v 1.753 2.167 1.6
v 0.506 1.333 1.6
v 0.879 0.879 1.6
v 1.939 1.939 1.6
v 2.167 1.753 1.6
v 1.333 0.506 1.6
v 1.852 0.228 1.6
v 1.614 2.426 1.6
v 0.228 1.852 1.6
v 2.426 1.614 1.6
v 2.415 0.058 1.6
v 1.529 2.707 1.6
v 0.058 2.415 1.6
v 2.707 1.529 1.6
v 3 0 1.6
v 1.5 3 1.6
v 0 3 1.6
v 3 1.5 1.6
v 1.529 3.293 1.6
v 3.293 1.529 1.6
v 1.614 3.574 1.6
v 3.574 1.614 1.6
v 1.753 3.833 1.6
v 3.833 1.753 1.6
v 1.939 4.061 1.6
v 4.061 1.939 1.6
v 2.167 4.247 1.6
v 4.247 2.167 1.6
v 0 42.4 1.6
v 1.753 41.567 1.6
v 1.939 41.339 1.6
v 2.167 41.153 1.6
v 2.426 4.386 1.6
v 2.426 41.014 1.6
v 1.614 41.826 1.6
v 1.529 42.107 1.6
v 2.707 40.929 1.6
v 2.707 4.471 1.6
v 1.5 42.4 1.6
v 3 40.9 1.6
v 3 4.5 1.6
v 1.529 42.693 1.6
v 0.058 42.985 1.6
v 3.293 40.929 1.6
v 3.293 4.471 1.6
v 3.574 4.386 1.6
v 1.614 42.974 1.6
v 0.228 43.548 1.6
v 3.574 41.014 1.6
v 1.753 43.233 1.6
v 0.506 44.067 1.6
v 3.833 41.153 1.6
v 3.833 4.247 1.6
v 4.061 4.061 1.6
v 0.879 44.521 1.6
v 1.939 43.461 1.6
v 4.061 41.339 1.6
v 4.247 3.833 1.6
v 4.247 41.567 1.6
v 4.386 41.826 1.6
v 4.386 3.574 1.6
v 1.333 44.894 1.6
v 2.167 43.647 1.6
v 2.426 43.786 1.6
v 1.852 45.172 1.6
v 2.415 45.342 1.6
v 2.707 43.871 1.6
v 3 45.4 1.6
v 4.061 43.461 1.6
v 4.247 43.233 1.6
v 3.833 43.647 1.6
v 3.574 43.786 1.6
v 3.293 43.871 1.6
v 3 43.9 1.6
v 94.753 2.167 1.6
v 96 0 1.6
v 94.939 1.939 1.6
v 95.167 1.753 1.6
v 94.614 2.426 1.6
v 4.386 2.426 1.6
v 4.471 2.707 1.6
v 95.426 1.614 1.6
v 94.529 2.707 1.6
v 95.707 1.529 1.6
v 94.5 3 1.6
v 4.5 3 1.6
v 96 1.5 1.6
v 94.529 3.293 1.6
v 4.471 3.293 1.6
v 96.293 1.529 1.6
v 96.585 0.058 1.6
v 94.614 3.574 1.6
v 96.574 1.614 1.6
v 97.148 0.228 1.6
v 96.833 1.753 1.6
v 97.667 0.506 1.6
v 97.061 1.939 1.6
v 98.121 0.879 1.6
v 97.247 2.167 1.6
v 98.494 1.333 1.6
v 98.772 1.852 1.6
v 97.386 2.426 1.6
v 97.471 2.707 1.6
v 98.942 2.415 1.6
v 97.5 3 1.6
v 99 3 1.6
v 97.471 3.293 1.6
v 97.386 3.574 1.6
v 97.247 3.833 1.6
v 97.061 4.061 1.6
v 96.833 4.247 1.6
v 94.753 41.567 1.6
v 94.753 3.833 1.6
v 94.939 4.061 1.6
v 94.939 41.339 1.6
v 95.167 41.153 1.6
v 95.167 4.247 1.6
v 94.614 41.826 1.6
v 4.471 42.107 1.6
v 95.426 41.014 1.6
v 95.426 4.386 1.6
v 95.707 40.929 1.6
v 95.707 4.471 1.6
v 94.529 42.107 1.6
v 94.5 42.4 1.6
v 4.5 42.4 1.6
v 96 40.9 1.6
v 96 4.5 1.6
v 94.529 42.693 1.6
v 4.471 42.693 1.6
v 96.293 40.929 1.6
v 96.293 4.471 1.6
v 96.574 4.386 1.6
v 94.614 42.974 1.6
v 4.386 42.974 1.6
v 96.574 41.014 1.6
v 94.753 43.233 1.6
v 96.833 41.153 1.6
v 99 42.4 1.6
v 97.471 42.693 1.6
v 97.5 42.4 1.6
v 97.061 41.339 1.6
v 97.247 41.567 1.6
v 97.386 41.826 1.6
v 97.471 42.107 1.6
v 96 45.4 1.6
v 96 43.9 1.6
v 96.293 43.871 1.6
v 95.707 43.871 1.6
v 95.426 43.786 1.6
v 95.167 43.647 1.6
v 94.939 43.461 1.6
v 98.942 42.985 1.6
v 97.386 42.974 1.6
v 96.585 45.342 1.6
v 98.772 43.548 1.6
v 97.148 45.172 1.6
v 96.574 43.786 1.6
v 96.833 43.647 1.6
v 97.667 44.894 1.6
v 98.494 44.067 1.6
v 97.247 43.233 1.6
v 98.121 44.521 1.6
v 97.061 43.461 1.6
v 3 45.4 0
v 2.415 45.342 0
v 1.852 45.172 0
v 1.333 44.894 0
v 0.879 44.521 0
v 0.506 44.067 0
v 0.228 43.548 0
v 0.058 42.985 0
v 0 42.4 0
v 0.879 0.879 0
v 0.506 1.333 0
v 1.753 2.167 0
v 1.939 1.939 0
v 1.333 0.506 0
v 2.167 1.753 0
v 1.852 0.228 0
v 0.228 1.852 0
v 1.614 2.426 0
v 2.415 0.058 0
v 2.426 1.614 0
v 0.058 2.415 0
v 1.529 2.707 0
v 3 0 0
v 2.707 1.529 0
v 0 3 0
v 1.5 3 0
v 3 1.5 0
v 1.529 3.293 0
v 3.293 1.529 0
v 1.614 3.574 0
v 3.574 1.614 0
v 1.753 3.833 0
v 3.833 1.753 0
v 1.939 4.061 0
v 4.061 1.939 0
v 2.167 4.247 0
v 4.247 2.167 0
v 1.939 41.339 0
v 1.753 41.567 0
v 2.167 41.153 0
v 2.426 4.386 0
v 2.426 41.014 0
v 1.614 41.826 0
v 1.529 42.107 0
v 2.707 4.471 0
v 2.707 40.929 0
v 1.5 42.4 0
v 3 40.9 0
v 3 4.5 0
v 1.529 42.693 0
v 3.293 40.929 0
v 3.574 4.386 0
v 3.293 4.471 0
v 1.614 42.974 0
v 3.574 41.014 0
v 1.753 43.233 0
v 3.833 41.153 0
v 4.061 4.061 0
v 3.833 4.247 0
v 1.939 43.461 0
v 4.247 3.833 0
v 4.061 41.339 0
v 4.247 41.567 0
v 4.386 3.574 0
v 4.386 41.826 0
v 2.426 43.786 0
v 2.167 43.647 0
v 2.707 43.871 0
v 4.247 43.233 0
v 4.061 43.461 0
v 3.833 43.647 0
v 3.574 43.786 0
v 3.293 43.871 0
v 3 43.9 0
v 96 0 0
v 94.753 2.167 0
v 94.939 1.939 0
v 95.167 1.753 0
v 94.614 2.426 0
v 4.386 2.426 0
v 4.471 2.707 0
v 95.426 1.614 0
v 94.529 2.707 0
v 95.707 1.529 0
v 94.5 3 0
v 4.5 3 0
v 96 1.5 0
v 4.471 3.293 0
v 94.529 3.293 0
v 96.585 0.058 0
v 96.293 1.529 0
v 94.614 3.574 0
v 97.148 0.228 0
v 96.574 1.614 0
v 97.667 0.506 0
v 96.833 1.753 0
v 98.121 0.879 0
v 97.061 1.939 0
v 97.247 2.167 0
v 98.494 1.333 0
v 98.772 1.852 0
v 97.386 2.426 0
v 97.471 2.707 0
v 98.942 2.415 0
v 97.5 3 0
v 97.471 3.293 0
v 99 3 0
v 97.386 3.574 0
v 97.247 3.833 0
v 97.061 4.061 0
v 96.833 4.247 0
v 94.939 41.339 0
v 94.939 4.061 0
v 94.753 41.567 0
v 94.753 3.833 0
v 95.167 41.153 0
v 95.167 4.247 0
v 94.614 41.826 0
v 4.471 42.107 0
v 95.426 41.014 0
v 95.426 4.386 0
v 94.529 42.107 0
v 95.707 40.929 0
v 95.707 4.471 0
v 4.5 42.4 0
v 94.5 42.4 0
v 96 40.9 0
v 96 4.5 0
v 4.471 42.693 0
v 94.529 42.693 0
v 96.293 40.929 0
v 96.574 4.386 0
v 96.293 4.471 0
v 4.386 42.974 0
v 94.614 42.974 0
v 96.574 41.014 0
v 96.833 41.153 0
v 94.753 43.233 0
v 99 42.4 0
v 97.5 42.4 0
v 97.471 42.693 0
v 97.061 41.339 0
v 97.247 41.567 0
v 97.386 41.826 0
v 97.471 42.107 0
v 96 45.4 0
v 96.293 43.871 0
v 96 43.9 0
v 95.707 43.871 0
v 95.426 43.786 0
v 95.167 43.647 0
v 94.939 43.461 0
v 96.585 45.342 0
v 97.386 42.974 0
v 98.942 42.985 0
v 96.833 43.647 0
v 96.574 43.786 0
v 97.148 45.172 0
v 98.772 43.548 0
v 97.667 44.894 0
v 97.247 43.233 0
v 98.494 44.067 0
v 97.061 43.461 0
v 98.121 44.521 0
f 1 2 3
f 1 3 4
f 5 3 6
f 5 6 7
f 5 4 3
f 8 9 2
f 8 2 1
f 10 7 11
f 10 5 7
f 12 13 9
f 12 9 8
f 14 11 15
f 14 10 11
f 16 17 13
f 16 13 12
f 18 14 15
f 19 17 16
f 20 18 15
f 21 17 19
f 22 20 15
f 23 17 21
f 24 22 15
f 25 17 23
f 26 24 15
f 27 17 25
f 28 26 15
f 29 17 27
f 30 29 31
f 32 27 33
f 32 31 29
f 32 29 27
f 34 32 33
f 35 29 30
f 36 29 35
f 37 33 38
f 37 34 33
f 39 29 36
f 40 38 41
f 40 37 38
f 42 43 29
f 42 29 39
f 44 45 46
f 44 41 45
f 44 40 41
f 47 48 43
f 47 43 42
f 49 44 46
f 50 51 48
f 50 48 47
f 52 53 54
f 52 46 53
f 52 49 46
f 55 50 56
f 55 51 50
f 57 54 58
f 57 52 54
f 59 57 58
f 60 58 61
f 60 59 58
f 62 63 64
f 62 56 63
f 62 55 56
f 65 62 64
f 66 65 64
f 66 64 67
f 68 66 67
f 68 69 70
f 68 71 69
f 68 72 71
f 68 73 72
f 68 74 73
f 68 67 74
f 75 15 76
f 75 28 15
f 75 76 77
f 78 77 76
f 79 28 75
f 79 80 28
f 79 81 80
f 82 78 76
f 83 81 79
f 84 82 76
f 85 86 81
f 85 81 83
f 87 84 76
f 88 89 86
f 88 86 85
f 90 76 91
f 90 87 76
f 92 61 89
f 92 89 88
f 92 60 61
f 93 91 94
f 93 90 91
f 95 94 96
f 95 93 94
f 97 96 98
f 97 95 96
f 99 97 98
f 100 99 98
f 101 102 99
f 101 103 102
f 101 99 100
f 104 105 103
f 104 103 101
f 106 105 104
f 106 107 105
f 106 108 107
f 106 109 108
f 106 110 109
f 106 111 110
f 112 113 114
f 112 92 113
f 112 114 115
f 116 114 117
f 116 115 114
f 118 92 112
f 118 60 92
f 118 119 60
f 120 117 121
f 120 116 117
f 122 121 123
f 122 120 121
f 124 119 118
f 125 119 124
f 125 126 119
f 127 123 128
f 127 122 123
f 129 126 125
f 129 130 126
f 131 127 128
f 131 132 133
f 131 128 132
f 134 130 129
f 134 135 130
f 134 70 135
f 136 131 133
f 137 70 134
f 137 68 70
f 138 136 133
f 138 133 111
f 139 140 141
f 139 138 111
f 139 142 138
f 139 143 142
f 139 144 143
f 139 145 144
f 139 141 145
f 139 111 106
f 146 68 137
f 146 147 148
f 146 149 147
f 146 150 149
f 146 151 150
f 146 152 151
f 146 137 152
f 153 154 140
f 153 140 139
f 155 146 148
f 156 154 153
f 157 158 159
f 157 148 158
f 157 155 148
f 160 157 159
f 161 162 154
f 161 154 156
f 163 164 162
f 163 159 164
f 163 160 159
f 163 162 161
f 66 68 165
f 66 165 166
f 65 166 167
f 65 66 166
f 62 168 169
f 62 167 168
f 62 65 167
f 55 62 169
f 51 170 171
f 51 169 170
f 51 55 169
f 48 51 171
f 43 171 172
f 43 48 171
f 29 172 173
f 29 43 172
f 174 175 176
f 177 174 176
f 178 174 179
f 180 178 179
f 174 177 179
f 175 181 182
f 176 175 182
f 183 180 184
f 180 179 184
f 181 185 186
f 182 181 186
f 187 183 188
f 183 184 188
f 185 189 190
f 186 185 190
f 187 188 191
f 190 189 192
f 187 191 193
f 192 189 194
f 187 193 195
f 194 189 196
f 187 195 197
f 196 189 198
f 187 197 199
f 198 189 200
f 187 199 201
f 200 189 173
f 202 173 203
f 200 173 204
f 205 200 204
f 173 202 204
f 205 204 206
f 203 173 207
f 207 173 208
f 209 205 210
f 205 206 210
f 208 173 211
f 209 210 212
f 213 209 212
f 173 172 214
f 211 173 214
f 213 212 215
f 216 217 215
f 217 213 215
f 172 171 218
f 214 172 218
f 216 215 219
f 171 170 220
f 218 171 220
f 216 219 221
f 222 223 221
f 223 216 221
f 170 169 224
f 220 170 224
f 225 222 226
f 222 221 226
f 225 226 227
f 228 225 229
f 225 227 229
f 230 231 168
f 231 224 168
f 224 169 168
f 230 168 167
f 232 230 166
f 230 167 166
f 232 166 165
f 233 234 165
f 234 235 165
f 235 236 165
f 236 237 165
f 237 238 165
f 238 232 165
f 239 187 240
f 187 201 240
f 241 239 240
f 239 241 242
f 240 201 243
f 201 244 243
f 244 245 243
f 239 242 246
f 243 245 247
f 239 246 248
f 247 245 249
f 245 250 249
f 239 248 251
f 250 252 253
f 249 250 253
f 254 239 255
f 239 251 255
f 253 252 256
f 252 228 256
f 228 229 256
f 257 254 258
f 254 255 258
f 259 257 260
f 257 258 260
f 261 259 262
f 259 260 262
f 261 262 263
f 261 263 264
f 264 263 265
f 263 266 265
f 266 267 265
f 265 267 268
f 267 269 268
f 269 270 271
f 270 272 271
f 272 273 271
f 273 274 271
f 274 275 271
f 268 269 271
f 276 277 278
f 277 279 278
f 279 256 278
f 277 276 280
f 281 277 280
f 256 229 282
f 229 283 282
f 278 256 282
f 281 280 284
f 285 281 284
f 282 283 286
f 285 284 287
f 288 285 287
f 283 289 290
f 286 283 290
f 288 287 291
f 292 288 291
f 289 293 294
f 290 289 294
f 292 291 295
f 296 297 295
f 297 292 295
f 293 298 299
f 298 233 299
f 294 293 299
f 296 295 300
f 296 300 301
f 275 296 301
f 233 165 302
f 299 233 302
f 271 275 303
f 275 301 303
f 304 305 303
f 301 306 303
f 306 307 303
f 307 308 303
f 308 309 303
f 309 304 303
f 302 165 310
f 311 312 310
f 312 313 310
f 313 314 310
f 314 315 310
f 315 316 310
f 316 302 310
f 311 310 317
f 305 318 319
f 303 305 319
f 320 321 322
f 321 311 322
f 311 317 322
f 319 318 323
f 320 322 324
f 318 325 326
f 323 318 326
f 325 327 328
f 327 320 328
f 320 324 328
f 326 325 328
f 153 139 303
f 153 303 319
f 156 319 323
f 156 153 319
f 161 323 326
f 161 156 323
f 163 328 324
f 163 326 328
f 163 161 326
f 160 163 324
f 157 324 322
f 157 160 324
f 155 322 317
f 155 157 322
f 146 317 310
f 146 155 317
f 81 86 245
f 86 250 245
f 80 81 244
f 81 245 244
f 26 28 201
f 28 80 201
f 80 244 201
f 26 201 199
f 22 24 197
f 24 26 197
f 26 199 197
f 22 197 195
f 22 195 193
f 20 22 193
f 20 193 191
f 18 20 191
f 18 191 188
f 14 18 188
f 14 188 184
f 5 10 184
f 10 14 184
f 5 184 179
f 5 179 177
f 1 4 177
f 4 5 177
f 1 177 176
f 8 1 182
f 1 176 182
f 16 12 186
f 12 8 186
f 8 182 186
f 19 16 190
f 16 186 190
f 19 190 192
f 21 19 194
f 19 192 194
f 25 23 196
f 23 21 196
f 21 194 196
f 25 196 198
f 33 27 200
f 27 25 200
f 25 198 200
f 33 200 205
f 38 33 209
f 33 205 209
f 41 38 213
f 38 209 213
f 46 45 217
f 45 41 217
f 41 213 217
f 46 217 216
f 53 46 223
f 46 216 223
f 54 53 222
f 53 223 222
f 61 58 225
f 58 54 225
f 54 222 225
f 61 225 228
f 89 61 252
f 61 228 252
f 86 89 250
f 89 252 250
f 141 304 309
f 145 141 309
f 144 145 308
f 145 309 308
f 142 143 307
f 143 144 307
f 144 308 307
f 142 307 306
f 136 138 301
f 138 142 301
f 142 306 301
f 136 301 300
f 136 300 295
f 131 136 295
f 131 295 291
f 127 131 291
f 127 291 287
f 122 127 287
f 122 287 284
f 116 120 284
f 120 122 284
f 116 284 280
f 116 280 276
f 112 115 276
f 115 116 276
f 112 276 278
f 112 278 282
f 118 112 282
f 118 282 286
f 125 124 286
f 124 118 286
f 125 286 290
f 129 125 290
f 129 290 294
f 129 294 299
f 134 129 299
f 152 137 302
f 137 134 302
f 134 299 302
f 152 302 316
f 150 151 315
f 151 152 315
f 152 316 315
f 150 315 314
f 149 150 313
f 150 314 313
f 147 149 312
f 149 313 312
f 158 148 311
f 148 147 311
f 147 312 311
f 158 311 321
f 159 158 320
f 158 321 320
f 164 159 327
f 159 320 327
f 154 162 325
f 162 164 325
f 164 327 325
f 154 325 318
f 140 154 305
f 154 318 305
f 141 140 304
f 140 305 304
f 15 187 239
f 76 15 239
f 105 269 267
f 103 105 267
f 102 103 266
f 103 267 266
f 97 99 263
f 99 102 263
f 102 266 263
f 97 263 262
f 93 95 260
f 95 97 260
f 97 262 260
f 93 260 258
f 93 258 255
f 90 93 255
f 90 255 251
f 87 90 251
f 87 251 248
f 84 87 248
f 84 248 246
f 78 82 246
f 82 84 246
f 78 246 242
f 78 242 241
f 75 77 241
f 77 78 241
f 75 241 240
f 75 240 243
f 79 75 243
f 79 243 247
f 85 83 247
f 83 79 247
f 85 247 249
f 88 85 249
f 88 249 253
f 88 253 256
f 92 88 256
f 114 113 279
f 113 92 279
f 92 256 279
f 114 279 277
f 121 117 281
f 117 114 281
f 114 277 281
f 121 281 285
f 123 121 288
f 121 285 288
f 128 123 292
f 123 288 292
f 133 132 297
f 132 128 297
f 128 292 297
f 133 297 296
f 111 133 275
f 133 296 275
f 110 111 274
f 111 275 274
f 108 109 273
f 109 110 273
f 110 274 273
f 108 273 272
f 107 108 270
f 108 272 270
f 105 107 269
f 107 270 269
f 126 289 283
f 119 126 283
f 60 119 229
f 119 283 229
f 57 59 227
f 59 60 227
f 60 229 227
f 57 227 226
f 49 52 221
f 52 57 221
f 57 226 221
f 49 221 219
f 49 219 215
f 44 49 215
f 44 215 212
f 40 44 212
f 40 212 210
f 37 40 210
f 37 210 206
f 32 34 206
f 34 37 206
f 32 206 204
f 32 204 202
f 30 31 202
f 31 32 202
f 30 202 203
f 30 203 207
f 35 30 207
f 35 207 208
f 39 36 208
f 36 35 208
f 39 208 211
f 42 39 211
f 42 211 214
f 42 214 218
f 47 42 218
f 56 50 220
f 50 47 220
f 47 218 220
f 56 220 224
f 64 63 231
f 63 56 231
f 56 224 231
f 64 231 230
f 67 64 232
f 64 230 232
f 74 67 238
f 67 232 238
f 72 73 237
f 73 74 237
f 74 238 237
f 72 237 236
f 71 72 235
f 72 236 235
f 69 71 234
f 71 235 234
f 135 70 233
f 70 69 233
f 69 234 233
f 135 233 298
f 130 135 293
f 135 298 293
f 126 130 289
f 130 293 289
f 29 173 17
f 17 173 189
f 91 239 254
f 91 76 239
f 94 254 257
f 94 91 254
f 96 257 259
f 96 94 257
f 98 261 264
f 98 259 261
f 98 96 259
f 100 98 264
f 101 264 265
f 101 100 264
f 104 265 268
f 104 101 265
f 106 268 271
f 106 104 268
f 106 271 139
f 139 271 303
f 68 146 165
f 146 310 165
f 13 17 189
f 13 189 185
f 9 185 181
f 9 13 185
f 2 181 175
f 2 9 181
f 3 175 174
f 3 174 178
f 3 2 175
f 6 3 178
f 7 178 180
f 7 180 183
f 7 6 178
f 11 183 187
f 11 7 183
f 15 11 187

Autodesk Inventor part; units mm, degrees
ref_plane "YZ Plane" through (0, 0, 0) normal (1, 0, 0) x (0, 1, 0)
ref_plane "XZ Plane" through (0, 0, 0) normal (0, 1, 0) x (-1, 0, 0)
ref_plane "XY Plane" through (0, 0, 0) normal (0, 0, 1) x (1, 0, 0)
sketch "Sketch1" plane through (0, 0, 0) normal (0, 0, 1) x (1, 0, 0)
  line L0 (0, 0) -> (99, 0)
  line L1 (99, 0) -> (99, 45.4)
  line L2 (99, 45.4) -> (0, 45.4)
  line L3 (0, 45.4) -> (0, 0)
  circle A0 centre (3, 42.4) radius 1.5
  circle A1 centre (3, 3) radius 1.5
  circle A2 centre (96, 3) radius 1.5
  circle A3 centre (96, 42.4) radius 1.5
  dimension "d0" = 45.4
  dimension "d1" = 99
  dimension "d2" = 3
  dimension "d3" = 3
  dimension "d4" = 3
  dimension "d5" = 3
  dimension "d6" = 3
  dimension "d7" = 3
  dimension "d8" = 3
  dimension "d9" = 3
  dimension "d10" = 3
  dimension "d11" = 3
  dimension "d12" = 3
  dimension "d13" = 3
extrude "Extrusion1" add sketch "Sketch1" along normal blind 1.6
fillet "Fillet1" radius 3 4 edges at (0, 0, 0.8) (99, 0, 0.8) (99, 45.4, 0.8) (0, 45.4, 0.8)
equation "\"d7\" = d6"
equation "\"d8\" = d9"
equation "\"d9\" = d7"
equation "\"d10\" = d11"
equation "\"d11\" = d8"
equation "\"d12\" = d10"
equation "\"d13\" = d12"
properties part number "Refplate"
